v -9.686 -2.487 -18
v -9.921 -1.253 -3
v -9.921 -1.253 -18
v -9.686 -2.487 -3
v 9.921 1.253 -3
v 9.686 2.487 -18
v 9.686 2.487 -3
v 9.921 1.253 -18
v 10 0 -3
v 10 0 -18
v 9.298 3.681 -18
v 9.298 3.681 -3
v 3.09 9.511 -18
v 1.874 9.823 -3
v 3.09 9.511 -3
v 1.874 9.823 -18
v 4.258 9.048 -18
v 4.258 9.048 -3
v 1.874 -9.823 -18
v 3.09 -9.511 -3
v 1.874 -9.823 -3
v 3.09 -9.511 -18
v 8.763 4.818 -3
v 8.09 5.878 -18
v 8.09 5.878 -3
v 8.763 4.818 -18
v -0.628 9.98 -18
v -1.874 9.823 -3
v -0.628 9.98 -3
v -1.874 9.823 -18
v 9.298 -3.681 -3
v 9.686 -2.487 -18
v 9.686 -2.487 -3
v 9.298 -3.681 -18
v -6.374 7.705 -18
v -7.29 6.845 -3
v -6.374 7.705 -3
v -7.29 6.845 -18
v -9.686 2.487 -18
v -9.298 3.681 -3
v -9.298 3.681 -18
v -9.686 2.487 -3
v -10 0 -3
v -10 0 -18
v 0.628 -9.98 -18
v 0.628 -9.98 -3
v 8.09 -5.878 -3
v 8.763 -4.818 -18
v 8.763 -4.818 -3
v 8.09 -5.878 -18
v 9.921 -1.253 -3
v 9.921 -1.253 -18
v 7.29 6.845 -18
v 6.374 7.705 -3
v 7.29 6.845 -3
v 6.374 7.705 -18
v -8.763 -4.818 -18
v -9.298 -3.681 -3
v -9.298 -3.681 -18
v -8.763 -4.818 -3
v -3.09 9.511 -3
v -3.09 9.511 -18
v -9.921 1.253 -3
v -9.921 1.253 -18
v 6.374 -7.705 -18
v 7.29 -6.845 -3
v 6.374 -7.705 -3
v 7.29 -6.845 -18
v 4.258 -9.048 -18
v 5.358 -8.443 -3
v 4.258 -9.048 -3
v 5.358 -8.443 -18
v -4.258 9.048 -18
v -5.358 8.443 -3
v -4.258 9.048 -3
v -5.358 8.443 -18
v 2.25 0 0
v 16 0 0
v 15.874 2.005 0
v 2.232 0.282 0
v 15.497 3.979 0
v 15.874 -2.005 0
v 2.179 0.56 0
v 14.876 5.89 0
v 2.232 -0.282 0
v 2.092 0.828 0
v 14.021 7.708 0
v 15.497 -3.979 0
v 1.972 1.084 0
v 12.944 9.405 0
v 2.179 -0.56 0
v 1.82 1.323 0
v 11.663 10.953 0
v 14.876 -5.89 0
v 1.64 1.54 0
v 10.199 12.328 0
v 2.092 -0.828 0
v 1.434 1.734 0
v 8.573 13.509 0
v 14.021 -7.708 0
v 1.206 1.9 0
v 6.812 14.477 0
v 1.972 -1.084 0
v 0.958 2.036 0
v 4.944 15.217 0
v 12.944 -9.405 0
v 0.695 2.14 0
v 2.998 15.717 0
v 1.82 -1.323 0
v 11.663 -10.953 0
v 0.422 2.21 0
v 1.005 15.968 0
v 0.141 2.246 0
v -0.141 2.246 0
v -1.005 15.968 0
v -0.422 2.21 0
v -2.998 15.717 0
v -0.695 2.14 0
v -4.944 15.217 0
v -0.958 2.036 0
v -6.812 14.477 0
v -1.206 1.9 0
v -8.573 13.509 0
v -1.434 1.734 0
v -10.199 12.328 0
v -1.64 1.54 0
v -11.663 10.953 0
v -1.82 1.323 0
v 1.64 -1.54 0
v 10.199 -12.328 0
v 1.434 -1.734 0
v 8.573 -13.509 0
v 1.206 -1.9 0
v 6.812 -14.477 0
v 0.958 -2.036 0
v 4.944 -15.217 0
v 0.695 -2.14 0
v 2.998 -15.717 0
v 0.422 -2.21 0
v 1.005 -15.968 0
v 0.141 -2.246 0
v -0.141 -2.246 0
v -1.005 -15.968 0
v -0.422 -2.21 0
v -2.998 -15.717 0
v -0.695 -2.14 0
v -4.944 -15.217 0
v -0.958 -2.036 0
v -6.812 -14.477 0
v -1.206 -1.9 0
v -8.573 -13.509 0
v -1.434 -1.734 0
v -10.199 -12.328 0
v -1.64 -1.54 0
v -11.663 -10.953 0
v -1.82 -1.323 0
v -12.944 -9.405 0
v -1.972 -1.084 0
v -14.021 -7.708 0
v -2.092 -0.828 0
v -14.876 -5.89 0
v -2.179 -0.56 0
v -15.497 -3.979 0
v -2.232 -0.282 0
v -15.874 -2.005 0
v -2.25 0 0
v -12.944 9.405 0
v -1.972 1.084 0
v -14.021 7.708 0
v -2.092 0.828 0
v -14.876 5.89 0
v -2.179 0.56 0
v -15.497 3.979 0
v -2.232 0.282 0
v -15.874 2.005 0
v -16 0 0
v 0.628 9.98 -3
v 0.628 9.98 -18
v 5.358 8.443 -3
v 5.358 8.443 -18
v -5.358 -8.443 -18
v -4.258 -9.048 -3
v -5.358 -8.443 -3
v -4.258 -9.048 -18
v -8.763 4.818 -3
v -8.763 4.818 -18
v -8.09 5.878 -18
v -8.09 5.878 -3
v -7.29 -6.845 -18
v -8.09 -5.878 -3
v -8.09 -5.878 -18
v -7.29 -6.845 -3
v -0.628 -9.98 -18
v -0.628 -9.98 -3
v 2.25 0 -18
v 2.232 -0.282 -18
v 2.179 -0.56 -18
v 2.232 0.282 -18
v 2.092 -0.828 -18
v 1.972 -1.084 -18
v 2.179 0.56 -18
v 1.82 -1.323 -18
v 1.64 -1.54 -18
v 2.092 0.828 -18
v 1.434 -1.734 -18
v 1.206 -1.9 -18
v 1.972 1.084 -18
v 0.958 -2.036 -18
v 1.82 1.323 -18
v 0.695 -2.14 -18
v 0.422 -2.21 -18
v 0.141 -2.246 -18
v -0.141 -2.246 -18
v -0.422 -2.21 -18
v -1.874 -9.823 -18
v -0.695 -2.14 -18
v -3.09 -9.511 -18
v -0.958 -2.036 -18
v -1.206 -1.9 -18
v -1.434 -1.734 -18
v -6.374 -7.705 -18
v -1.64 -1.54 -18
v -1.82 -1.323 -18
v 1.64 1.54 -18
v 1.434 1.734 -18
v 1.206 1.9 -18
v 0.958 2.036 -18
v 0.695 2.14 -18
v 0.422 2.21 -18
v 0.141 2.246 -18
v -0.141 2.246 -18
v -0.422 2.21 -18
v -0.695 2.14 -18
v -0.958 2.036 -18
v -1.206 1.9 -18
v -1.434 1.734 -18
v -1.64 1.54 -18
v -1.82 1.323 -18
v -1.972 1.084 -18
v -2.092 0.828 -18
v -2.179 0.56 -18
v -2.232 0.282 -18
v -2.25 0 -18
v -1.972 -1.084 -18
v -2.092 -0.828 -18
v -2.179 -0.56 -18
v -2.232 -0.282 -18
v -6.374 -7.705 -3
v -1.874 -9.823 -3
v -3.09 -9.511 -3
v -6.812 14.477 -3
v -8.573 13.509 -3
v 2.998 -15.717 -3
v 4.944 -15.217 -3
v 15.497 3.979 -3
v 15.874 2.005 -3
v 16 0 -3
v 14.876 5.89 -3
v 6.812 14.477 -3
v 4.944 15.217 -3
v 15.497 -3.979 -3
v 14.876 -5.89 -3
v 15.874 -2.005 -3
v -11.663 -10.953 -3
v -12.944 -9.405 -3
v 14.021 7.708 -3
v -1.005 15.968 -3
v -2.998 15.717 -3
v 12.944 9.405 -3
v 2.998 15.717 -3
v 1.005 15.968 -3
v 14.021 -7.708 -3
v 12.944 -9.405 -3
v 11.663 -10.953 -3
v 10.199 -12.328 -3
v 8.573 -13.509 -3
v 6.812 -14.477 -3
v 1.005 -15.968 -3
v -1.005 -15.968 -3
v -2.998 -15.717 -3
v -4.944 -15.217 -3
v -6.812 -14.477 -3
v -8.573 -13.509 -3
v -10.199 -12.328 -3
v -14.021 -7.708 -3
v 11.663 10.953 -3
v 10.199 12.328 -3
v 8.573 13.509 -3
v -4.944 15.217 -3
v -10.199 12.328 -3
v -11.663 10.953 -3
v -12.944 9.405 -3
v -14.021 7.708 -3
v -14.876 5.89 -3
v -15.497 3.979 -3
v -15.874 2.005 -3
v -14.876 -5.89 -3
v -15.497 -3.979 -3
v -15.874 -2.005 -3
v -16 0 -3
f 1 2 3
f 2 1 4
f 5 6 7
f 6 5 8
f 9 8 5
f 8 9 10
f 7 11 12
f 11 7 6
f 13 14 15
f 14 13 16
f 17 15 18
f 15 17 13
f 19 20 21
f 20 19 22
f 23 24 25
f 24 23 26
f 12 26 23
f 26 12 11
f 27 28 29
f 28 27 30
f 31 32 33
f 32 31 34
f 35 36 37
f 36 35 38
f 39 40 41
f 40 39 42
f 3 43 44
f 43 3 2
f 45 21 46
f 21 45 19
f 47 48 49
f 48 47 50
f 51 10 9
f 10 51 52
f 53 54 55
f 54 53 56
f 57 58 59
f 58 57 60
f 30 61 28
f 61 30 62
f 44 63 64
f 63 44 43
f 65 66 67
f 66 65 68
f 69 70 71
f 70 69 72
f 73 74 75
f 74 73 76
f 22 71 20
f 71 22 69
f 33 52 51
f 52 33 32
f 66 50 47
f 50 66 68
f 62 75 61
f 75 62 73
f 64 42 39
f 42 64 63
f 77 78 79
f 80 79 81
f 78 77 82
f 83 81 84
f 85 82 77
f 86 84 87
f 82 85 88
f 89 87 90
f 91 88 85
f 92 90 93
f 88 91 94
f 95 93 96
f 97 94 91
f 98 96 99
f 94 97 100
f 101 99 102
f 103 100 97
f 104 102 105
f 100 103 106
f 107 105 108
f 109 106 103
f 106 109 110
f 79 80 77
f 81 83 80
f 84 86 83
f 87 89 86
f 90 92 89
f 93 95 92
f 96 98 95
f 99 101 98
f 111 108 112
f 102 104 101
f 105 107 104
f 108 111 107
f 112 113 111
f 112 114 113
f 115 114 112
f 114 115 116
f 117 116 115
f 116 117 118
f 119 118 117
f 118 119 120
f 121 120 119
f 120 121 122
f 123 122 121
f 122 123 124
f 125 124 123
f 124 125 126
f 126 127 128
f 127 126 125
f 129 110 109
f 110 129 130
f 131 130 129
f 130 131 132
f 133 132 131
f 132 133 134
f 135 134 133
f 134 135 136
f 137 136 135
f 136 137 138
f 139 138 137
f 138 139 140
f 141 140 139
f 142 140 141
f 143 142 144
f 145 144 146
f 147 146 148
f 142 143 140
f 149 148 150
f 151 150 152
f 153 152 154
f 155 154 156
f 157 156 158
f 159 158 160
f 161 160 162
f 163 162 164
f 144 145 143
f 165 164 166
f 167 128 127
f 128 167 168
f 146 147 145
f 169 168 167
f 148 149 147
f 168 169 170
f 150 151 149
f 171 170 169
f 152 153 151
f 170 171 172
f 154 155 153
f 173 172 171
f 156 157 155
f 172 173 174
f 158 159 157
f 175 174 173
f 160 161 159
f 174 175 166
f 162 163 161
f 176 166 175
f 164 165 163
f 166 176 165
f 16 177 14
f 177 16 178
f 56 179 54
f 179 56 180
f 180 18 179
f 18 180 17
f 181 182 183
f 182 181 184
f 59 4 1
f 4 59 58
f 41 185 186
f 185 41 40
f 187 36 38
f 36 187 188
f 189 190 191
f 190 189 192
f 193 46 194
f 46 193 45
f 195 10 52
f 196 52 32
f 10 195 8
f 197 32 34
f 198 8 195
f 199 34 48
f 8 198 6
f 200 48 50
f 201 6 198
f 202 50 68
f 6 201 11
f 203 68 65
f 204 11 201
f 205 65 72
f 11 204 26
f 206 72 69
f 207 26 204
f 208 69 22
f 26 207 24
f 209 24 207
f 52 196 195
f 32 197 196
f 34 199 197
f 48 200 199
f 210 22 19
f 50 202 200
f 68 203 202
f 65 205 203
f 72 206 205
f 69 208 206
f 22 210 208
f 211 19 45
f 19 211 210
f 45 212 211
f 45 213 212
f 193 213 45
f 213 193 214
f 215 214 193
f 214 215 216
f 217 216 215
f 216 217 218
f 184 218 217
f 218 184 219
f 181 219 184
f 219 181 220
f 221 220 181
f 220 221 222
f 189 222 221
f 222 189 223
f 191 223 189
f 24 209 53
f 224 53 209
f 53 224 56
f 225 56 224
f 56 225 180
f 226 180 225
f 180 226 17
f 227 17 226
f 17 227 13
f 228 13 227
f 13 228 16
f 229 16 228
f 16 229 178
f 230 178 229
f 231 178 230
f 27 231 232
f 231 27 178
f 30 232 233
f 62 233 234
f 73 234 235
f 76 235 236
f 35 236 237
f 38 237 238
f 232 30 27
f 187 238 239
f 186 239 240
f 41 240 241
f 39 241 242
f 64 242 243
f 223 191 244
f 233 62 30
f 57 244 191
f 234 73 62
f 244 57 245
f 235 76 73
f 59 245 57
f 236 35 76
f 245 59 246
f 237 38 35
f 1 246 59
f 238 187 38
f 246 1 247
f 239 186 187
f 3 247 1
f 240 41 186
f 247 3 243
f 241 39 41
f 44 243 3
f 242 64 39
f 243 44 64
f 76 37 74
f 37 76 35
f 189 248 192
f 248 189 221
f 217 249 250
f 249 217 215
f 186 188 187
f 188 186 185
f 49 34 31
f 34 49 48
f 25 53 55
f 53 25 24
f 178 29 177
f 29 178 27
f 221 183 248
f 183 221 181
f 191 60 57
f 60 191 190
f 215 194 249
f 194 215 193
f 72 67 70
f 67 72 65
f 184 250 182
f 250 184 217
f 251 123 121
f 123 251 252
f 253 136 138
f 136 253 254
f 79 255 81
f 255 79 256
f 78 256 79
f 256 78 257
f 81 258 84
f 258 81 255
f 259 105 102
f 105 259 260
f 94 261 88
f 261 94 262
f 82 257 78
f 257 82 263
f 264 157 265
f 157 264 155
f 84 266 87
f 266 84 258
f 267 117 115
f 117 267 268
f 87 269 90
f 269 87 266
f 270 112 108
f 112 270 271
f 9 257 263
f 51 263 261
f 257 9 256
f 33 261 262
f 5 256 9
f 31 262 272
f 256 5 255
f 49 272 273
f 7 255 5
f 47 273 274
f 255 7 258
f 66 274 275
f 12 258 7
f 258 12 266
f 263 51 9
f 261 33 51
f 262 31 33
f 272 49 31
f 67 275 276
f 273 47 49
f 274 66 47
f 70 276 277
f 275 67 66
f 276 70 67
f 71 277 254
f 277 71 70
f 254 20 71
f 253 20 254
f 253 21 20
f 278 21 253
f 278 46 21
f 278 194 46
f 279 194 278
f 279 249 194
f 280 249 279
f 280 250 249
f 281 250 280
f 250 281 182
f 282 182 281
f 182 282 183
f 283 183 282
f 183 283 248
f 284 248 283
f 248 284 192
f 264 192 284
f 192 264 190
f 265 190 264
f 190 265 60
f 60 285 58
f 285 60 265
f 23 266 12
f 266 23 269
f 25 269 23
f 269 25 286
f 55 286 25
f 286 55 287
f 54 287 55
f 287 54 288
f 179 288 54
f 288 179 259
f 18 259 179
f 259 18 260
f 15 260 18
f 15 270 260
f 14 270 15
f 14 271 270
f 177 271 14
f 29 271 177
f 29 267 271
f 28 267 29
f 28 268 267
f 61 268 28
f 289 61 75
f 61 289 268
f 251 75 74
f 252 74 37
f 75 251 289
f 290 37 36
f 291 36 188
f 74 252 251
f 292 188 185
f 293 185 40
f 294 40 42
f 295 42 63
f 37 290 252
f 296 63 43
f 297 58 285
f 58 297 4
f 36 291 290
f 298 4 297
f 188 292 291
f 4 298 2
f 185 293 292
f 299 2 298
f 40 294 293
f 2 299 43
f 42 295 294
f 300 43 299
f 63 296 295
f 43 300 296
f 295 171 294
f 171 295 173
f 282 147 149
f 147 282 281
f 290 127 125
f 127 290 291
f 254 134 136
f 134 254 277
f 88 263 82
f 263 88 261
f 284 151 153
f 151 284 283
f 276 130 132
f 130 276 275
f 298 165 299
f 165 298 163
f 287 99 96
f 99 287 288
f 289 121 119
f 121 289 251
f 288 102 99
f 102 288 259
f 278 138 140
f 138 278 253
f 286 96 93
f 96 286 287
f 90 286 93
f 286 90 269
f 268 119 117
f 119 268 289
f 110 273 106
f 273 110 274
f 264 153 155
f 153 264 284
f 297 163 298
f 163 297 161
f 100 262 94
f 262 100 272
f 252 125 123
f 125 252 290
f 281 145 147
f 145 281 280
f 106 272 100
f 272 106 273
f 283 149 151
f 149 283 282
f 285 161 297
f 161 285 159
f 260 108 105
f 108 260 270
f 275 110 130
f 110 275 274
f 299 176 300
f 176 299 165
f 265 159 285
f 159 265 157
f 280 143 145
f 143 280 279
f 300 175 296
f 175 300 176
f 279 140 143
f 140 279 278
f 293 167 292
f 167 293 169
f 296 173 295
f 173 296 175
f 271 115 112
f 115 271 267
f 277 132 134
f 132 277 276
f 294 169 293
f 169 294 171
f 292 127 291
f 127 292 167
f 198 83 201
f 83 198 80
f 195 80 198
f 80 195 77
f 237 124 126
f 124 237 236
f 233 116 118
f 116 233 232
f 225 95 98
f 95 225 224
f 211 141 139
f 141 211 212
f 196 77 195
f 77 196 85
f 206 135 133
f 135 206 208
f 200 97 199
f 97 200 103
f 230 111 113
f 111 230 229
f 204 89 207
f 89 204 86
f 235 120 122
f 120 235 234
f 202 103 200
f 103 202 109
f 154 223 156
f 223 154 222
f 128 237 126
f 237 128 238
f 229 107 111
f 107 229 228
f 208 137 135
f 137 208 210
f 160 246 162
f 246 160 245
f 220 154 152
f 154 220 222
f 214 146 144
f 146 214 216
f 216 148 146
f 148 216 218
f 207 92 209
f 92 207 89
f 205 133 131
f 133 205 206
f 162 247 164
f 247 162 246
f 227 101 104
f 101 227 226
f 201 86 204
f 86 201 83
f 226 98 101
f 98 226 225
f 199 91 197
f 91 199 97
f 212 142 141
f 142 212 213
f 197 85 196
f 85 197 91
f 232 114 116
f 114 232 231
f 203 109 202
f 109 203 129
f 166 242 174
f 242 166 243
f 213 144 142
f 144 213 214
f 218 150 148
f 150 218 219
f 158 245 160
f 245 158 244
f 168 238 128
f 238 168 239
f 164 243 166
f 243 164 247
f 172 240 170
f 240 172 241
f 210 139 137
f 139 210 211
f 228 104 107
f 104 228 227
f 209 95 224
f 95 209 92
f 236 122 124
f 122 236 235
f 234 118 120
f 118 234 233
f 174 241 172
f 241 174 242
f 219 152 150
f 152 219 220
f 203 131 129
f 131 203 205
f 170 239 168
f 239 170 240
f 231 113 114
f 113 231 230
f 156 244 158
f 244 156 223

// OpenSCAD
$fn = 50;


difference() {
	union() {
		translate(v = [0, 0, -18.0000000000]) {
			cylinder(h = 18, r = 10.0000000000);
		}
		translate(v = [0, 0, -3.0000000000]) {
			cylinder(h = 3, r = 16.0000000000);
		}
	}
	union() {
		#translate(v = [0, 0, -18]) {
			cylinder(h = 18, r = 2.2500000000);
		}
	}
}
